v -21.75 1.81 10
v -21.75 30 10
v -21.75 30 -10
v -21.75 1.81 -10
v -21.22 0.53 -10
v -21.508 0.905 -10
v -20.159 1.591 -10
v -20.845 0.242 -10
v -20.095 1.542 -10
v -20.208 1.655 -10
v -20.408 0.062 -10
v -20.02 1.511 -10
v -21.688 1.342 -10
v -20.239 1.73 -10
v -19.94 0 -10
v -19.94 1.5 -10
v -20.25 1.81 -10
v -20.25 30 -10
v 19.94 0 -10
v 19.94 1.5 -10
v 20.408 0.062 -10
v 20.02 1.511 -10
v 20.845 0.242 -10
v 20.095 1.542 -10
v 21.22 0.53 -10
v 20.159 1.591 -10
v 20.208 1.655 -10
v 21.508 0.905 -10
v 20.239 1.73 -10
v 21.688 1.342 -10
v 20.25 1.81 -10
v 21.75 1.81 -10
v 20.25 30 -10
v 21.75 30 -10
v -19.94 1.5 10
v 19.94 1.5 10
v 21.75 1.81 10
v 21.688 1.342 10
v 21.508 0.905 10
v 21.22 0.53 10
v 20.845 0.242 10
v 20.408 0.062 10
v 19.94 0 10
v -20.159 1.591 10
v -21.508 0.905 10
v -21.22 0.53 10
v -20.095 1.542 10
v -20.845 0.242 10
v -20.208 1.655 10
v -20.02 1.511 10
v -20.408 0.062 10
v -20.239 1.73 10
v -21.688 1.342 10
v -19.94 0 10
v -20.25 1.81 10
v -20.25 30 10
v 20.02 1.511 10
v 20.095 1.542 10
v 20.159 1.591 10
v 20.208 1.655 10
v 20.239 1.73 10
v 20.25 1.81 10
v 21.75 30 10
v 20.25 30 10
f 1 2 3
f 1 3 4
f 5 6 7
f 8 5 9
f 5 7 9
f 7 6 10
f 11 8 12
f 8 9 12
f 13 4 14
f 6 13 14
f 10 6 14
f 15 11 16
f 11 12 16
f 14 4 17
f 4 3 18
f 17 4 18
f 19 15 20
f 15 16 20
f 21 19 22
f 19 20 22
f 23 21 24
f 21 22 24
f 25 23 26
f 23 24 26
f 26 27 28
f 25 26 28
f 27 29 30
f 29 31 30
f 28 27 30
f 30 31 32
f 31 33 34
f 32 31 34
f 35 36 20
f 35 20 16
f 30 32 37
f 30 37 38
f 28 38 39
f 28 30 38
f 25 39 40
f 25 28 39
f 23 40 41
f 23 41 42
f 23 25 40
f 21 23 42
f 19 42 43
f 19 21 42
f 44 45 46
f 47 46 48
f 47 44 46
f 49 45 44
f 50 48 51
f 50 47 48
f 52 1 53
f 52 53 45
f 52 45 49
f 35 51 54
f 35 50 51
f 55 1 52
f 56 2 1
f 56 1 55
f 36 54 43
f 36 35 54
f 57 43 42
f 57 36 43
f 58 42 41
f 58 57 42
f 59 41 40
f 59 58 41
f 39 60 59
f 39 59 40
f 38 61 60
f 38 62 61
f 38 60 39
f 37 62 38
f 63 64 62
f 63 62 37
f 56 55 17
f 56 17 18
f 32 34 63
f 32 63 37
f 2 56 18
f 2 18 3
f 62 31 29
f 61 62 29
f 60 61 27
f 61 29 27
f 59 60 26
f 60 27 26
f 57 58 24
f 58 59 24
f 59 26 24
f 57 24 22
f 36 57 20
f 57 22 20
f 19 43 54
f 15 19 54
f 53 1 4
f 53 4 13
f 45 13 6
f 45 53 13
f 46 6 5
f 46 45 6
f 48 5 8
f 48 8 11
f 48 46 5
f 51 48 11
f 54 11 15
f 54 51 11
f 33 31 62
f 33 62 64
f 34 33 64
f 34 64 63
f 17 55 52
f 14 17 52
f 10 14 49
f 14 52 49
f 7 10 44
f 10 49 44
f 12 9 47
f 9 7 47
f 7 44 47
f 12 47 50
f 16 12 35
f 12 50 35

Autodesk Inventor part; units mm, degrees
ref_plane "YZ Plane" through (0, 0, 0) normal (1, 0, 0) x (0, 1, 0)
ref_plane "XZ Plane" through (0, 0, 0) normal (0, 1, 0) x (-1, 0, 0)
ref_plane "XY Plane" through (0, 0, 0) normal (0, 0, 1) x (1, 0, 0)
sketch "Sketch1" plane through (0, 0, 0) normal (0, 1, 0) x (-1, 0, 0)
  line L0 (20.25, -10) -> (-20.25, -10)
  line L1 (-20.25, -10) -> (-20.25, 10)
  line L2 (-20.25, 10) -> (20.25, 10)
  line L3 (20.25, 10) -> (20.25, -10)
  point P0 (0, 0)
  dimension "d0" = 40.5
  dimension "d1" = 20
  dimension "d2" = 10
  dimension "d3" = 20.25
extrude "Plate1" add sketch "Sketch1" along normal blind 1.5
sketch "Sketch2" plane through (21.75, 0, -10) normal (-1, 0, 0) x (0, -1, 0)
  line L0 (0, 20) -> (0, 0)
  line L1 (0, 0) -> (-30, 0)
  line L2 (-30, 0) -> (-30, 20)
  line L3 (-30, 20) -> (0, 20)
edge flange "Flange1" height 30 angle 90 thickness 1.5 bend radius 0.31 thickness toward (-1, 0, 0) relief tear relief width 1.5 relief depth 0.75 edges at (20.25, 1.5, 0) wall of the first edge with corners at (21.75, 0, 10) (21.75, 0, -10) (21.75, 30, -10) (21.75, 30, 10)
bend "Bend1"
corner "Corner1"
sketch "Sketch3" plane through (-21.75, 0, 10) normal (1, 0, 0) x (0, 1, 0)
  line L0 (0, -20) -> (0, 0)
  line L1 (0, 0) -> (30, 0)
  line L2 (30, 0) -> (30, -20)
  line L3 (30, -20) -> (0, -20)
edge flange "Flange2" height 30 angle 90 thickness 1.5 bend radius 0.31 thickness toward (1, 0, 0) relief tear relief width 1.5 relief depth 0.75 edges at (-20.25, 1.5, 0) wall of the first edge with corners at (-21.75, 0, -10) (-21.75, 0, 10) (-21.75, 30, 10) (-21.75, 30, -10)
bend "Bend2"
corner "Corner2"
equation "\"d4\" = Thickness"
equation "\"d5\" = BendReliefWidth"
equation "\"d6\" = BendReliefDepth"
equation "\"d7\" = MinimumRemnant"
equation "\"d8\" = TransitionRadius"
equation "\"d11\" = BendRadius"
equation "\"d12\" = CornerReliefSize"
equation "\"d13\" = GapSize"
equation "\"d14\" = JacobiRadiusSize"
equation "\"d15\" = BendReliefWidth"
equation "\"d16\" = BendReliefDepth"
equation "\"d17\" = MinimumRemnant"
equation "\"d18\" = TransitionRadius"
equation "\"d21\" = BendRadius"
equation "\"d22\" = CornerReliefSize"
equation "\"d23\" = GapSize"
equation "\"d24\" = JacobiRadiusSize"
equation "\"BendReliefWidth\" = Thickness"
equation "\"BendReliefDepth\" = 0.5 * Thickness"
equation "\"CornerReliefSize\" = 4 * Thickness"
equation "\"MinimumRemnant\" = 2 * Thickness"
equation "\"TransitionRadius\" = BendRadius"
equation "\"JacobiRadiusSize\" = BendRadius"
equation "\"GapSize\" = Thickness"
equation "\"Thickness\" = 1.5"
equation "\"BendRadius\" = 0.31"
properties part number "axis_10_top_frame" material "Aluminum 6061-AHC"
